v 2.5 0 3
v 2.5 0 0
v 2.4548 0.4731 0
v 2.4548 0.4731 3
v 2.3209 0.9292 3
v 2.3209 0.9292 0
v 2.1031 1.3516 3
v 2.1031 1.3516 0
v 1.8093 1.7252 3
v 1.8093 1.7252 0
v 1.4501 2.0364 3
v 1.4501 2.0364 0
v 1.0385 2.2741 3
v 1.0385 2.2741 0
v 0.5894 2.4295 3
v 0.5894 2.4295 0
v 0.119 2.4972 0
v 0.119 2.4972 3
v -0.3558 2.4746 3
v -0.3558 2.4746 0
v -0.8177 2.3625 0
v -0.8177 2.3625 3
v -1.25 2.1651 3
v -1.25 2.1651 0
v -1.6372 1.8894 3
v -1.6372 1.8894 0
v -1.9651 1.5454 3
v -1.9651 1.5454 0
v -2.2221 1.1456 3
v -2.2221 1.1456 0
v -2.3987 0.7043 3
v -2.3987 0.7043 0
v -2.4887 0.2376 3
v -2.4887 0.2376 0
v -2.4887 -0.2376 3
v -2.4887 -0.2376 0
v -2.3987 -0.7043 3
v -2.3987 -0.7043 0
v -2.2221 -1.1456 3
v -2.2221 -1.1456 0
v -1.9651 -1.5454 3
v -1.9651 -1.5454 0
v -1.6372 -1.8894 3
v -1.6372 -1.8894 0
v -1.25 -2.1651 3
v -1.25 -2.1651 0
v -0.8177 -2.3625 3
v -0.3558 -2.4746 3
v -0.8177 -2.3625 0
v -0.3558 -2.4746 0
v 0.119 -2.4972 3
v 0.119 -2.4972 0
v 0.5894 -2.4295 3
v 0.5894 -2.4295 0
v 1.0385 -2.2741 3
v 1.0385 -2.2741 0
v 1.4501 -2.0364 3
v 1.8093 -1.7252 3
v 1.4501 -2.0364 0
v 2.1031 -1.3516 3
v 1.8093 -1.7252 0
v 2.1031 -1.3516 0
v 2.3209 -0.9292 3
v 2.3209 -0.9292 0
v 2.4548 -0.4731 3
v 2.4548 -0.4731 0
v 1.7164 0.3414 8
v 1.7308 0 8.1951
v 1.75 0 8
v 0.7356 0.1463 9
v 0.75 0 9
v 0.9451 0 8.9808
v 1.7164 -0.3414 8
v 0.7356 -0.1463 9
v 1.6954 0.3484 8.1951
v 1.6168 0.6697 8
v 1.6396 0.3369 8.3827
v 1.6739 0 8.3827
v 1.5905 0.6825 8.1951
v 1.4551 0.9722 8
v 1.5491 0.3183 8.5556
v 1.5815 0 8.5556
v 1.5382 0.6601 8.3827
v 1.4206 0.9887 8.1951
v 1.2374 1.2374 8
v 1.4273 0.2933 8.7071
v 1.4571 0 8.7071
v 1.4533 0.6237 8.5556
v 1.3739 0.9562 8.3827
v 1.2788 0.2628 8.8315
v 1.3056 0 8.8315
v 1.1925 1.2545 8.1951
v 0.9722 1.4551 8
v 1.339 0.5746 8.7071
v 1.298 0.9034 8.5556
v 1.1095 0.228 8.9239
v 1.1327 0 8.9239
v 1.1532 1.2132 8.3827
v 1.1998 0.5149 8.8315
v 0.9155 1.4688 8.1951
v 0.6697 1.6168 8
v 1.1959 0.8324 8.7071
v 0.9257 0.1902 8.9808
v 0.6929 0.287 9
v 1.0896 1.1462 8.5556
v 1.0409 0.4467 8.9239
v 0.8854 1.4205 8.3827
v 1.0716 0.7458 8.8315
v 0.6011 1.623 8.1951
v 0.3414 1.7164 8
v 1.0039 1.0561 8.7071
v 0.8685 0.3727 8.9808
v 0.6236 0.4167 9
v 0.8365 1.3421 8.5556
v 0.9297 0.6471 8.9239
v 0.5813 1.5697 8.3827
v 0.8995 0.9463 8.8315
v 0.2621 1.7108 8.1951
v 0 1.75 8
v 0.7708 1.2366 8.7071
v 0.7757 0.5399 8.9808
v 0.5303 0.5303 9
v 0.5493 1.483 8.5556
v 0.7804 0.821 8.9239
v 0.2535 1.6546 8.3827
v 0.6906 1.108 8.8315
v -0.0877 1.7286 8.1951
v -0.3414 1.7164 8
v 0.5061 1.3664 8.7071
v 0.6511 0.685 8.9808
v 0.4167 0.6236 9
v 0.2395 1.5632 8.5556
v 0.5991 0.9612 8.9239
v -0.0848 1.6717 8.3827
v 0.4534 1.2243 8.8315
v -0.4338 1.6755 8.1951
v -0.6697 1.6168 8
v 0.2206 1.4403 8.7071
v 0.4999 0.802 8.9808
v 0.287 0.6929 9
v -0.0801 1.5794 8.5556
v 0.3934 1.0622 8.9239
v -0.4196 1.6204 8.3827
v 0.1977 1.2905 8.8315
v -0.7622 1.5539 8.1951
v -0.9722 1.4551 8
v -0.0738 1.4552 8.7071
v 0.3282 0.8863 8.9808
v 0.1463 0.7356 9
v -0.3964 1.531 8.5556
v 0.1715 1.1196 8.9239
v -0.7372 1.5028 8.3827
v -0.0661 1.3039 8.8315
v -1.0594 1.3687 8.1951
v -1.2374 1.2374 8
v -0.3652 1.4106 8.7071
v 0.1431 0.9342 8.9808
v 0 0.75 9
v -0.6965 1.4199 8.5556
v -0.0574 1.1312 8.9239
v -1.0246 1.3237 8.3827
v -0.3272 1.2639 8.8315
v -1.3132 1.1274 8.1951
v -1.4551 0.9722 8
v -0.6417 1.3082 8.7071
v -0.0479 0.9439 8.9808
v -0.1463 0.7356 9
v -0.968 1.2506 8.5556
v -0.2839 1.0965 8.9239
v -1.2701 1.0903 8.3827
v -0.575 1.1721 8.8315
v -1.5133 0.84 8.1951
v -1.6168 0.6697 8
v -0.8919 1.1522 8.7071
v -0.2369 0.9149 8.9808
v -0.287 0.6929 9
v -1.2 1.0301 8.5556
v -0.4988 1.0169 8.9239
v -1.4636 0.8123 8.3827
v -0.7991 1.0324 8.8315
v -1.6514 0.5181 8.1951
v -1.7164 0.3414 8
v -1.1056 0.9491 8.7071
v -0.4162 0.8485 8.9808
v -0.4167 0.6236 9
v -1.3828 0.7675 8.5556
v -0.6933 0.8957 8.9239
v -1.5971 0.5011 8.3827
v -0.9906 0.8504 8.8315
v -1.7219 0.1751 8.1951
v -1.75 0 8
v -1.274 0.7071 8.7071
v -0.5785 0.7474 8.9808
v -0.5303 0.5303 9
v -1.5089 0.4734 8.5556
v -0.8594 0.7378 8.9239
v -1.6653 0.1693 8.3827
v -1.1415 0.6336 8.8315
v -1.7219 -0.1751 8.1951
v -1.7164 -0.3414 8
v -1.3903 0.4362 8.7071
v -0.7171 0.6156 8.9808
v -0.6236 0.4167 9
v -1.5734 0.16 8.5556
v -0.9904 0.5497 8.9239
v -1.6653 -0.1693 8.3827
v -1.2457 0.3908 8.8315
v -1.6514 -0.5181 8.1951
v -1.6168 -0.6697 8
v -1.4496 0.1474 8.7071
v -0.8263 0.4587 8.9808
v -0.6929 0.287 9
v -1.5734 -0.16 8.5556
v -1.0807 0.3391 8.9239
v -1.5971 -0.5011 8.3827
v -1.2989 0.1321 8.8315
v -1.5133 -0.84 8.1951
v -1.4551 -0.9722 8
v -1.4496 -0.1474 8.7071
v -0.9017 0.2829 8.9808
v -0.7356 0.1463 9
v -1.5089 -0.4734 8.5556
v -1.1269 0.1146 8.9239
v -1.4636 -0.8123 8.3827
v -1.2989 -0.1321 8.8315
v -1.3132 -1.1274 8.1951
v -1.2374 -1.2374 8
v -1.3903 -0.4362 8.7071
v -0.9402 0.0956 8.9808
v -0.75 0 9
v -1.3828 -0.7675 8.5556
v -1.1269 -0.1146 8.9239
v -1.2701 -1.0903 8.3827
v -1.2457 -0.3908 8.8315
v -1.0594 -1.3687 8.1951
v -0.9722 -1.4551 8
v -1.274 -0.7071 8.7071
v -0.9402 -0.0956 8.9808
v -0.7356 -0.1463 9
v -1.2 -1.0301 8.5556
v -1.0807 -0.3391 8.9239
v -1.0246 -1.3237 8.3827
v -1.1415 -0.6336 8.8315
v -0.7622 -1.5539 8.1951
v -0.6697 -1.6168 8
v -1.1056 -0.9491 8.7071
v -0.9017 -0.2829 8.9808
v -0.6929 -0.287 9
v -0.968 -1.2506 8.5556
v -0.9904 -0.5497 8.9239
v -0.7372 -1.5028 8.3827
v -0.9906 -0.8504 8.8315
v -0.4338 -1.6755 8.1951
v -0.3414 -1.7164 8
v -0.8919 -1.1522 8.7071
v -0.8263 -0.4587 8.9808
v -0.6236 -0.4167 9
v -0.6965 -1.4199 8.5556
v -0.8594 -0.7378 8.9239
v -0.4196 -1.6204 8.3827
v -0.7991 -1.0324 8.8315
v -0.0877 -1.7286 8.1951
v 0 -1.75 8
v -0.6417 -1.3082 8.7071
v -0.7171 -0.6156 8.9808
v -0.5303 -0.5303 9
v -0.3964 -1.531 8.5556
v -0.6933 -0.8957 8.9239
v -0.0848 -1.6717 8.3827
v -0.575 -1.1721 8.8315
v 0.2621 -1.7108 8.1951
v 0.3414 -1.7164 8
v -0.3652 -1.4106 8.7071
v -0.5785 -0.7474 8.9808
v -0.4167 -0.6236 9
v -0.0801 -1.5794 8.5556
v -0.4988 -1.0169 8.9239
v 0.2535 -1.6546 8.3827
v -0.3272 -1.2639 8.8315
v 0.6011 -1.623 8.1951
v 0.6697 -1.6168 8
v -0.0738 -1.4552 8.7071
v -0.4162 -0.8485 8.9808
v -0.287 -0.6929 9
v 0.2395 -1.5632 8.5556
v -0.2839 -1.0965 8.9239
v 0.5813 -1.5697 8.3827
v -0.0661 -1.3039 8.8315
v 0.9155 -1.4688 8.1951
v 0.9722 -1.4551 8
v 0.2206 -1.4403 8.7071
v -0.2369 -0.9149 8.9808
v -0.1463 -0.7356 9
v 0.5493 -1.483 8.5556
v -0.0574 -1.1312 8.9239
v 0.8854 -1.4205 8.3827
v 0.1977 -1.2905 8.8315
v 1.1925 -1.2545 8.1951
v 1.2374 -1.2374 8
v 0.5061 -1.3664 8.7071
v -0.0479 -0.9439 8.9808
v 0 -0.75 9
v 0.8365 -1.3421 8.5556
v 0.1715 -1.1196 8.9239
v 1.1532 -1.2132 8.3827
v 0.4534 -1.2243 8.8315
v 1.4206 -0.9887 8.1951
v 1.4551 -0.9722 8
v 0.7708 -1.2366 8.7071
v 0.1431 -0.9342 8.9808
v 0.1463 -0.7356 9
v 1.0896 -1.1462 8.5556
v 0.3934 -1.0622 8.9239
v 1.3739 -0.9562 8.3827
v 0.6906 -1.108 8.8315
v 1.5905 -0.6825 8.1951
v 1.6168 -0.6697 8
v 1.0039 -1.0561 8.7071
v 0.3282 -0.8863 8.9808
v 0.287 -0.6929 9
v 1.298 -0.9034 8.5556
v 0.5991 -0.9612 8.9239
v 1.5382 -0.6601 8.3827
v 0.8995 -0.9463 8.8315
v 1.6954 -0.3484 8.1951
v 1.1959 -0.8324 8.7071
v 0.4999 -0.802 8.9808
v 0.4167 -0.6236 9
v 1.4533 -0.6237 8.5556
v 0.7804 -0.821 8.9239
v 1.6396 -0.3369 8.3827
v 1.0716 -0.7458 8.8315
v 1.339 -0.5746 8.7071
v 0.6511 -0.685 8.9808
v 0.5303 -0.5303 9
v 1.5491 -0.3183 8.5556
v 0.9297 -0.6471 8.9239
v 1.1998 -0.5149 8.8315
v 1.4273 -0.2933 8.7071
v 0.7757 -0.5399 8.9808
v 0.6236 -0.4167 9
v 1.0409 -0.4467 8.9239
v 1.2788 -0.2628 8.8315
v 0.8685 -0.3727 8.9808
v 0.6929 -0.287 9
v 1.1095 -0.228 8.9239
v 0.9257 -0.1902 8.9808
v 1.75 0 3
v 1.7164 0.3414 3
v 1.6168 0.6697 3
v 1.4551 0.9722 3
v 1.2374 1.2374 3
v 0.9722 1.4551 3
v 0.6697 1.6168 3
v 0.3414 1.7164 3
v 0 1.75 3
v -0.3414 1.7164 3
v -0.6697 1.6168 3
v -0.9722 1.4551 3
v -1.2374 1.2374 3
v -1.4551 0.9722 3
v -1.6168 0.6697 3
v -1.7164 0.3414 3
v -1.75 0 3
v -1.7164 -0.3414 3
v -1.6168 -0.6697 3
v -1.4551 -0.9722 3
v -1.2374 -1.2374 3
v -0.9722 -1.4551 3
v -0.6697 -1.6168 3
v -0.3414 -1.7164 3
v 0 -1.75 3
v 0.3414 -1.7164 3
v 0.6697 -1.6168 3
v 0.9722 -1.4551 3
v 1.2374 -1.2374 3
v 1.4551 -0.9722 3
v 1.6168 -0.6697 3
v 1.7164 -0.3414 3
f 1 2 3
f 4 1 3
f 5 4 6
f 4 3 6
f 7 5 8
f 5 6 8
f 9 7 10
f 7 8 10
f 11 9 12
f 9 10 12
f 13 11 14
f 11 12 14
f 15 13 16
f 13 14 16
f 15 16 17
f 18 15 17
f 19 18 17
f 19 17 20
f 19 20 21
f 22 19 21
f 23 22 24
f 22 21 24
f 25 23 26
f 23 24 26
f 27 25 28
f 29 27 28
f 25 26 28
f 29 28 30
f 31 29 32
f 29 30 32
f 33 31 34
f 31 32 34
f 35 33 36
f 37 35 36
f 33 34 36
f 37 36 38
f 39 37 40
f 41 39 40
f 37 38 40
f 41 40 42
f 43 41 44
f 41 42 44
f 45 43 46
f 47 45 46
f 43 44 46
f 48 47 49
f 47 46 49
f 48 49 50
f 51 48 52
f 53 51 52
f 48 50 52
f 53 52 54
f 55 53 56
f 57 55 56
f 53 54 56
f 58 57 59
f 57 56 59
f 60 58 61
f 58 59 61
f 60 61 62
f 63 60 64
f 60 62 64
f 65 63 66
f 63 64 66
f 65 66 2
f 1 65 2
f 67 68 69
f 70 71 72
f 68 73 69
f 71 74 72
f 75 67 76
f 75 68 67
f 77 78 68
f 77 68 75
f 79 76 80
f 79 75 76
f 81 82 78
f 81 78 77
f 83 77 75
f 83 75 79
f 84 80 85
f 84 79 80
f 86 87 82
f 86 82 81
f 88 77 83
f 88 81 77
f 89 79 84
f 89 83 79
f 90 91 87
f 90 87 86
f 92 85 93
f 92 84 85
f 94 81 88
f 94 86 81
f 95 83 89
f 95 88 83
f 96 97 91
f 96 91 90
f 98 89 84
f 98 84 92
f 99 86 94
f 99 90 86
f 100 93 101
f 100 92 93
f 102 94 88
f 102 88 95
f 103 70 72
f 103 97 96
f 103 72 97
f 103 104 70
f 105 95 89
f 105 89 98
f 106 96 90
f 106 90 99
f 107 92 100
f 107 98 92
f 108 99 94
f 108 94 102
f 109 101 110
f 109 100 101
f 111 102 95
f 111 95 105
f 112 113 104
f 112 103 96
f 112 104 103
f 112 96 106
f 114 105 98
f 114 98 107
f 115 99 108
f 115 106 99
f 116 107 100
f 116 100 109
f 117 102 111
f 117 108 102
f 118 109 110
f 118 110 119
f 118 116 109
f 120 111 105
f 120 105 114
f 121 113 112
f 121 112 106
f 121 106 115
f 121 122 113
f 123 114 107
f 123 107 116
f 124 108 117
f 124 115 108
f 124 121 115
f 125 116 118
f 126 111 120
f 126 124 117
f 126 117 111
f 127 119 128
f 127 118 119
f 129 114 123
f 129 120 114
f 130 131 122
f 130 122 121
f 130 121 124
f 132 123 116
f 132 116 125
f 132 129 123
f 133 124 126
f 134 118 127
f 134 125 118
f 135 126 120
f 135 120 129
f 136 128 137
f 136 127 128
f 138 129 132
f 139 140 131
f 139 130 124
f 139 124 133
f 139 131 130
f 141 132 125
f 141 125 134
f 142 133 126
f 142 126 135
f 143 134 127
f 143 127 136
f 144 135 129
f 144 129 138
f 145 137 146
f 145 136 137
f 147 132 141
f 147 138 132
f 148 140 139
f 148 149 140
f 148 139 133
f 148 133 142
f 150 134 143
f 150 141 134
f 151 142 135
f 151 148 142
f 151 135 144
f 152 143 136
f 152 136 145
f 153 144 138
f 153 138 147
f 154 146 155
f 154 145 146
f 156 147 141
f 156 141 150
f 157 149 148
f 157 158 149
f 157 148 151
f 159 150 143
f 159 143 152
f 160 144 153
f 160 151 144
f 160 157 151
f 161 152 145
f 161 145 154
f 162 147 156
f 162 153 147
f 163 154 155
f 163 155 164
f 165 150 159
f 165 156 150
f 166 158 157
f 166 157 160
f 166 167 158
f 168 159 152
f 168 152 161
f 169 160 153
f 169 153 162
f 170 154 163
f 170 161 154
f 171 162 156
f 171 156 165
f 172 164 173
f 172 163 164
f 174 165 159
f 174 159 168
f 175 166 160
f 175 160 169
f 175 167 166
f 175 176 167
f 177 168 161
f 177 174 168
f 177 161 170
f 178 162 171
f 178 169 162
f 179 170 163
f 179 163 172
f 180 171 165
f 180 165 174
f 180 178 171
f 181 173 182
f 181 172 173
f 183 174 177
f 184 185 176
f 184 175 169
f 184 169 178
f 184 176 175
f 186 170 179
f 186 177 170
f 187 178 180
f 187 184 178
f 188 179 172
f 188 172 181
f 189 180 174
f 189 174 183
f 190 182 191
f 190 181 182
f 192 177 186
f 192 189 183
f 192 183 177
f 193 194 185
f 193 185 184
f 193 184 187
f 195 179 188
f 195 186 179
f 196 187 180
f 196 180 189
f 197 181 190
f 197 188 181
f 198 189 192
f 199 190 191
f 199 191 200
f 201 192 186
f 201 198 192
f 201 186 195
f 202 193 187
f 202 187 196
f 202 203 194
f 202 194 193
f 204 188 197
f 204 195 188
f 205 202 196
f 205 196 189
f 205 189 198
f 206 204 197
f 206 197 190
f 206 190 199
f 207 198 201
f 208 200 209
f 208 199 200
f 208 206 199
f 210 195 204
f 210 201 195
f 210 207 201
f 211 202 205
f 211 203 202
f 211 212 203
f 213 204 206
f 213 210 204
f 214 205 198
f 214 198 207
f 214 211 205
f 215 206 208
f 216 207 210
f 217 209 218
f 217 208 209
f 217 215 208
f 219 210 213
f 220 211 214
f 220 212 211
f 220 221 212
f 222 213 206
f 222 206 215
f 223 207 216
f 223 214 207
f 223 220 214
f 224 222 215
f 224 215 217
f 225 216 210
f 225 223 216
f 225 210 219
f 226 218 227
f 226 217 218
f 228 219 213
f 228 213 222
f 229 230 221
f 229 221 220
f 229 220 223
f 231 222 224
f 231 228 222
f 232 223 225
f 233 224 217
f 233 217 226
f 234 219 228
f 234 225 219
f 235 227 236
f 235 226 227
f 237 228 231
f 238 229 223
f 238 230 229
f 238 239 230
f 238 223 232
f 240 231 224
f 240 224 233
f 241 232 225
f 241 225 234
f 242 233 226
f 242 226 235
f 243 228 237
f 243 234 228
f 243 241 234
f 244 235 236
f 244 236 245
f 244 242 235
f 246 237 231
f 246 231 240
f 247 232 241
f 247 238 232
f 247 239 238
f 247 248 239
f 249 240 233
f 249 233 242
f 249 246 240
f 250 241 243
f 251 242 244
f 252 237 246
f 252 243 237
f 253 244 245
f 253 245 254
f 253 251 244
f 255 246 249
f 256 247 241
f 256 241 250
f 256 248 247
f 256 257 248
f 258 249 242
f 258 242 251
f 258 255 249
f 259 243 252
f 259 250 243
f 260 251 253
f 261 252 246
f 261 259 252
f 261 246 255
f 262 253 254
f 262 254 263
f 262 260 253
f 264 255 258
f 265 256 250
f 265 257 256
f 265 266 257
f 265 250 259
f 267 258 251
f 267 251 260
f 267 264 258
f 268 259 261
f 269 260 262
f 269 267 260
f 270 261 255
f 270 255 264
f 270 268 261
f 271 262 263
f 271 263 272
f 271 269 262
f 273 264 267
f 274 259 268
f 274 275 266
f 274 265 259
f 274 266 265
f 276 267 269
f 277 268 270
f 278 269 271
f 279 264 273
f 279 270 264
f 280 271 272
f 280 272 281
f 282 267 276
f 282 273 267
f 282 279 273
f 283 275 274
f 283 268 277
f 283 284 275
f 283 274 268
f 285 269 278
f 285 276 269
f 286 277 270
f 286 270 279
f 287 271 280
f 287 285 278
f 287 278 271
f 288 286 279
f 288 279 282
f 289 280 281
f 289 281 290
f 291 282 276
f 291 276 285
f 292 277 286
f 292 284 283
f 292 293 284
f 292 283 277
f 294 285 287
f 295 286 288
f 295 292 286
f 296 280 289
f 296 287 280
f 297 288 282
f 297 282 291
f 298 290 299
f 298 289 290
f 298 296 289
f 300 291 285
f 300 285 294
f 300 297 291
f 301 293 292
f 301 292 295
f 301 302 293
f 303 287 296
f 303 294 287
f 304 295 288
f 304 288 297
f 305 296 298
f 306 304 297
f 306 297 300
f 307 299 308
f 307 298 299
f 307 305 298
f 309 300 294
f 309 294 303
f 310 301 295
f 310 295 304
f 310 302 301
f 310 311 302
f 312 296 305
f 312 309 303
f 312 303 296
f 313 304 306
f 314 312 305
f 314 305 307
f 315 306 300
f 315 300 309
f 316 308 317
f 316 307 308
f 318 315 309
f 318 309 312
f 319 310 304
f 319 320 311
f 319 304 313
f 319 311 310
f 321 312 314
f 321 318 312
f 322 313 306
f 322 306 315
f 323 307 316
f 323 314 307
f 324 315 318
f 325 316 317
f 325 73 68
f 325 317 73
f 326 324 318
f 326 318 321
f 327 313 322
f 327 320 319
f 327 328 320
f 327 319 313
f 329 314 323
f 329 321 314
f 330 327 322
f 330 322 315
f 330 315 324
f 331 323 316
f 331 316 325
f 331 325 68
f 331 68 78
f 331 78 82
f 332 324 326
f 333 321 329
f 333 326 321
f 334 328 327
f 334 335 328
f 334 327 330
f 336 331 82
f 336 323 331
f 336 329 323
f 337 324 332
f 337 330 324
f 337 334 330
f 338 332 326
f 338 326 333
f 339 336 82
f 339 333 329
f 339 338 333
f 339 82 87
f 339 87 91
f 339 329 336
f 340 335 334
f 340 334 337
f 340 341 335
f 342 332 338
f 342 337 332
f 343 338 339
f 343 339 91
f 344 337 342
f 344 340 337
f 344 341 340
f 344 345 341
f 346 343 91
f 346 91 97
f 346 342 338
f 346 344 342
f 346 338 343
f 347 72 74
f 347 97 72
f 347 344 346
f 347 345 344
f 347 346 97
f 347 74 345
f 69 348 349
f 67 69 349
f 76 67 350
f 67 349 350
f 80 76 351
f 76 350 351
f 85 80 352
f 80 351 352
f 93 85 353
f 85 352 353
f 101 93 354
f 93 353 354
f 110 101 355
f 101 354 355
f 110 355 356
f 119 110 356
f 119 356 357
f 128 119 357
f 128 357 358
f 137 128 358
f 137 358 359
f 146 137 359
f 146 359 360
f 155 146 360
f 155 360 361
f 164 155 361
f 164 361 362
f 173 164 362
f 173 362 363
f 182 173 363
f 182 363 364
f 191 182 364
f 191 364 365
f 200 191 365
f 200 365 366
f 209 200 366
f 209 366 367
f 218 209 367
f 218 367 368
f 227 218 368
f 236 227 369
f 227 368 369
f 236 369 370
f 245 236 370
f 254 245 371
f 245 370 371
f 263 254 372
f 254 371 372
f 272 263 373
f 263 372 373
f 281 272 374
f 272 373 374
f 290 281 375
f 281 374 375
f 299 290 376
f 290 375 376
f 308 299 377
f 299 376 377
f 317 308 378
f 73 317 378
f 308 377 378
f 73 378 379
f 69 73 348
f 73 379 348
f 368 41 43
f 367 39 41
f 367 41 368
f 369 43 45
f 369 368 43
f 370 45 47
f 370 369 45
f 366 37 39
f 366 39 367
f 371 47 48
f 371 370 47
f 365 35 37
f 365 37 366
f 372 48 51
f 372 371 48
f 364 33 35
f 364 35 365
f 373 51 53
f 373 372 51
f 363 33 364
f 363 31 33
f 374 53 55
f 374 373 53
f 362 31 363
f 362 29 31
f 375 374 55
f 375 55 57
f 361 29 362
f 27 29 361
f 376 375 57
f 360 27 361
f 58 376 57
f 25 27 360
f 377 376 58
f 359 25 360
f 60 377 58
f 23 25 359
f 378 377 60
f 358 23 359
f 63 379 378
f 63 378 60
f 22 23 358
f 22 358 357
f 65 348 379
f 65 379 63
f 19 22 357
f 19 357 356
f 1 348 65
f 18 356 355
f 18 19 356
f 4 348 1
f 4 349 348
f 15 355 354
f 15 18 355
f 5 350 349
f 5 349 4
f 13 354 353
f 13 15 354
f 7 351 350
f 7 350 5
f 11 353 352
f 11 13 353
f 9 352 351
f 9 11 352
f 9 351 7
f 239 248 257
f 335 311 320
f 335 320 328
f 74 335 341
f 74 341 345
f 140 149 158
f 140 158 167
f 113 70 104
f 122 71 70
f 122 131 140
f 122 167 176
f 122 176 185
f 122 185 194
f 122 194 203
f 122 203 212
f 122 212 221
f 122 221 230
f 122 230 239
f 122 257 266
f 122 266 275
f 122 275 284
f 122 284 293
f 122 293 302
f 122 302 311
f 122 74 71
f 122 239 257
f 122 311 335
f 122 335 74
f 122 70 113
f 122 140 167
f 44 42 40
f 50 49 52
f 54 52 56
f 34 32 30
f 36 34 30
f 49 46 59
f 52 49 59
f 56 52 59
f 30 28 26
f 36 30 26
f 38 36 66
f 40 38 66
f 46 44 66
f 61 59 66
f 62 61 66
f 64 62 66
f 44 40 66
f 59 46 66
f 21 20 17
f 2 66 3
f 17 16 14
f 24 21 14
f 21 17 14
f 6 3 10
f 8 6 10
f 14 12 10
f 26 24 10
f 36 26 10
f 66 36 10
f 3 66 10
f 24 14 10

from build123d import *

# Parameters (mm, degrees)
CYLINDER001_R     = 1.75
CYLINDER001_DEPTH = 9
CYLINDER_R        = 2.5
CYLINDER_DEPTH    = 3
FILLET_R          = 1


with BuildPart() as cilindro001:
    # Cylinder001 → Cylinder001 (new body)
    with BuildSketch(Plane.XY):
        Circle(CYLINDER001_R)
    extrude(amount=CYLINDER001_DEPTH)


with BuildPart() as fillet_body:
    # Cylinder → Cylinder (new body)
    with BuildSketch(Plane.XY):
        Circle(CYLINDER_R)
    extrude(amount=CYLINDER_DEPTH)

    # Fusion: union Cilindro001
    add(cilindro001.part)

    # Fillet
    fillet_edges = [fillet_body.edges().sort_by_distance(p)[0] for p in [
        (-1.75, 0, 9),
    ]]
    fillet(fillet_edges, radius=FILLET_R)


solid = fillet_body.part
